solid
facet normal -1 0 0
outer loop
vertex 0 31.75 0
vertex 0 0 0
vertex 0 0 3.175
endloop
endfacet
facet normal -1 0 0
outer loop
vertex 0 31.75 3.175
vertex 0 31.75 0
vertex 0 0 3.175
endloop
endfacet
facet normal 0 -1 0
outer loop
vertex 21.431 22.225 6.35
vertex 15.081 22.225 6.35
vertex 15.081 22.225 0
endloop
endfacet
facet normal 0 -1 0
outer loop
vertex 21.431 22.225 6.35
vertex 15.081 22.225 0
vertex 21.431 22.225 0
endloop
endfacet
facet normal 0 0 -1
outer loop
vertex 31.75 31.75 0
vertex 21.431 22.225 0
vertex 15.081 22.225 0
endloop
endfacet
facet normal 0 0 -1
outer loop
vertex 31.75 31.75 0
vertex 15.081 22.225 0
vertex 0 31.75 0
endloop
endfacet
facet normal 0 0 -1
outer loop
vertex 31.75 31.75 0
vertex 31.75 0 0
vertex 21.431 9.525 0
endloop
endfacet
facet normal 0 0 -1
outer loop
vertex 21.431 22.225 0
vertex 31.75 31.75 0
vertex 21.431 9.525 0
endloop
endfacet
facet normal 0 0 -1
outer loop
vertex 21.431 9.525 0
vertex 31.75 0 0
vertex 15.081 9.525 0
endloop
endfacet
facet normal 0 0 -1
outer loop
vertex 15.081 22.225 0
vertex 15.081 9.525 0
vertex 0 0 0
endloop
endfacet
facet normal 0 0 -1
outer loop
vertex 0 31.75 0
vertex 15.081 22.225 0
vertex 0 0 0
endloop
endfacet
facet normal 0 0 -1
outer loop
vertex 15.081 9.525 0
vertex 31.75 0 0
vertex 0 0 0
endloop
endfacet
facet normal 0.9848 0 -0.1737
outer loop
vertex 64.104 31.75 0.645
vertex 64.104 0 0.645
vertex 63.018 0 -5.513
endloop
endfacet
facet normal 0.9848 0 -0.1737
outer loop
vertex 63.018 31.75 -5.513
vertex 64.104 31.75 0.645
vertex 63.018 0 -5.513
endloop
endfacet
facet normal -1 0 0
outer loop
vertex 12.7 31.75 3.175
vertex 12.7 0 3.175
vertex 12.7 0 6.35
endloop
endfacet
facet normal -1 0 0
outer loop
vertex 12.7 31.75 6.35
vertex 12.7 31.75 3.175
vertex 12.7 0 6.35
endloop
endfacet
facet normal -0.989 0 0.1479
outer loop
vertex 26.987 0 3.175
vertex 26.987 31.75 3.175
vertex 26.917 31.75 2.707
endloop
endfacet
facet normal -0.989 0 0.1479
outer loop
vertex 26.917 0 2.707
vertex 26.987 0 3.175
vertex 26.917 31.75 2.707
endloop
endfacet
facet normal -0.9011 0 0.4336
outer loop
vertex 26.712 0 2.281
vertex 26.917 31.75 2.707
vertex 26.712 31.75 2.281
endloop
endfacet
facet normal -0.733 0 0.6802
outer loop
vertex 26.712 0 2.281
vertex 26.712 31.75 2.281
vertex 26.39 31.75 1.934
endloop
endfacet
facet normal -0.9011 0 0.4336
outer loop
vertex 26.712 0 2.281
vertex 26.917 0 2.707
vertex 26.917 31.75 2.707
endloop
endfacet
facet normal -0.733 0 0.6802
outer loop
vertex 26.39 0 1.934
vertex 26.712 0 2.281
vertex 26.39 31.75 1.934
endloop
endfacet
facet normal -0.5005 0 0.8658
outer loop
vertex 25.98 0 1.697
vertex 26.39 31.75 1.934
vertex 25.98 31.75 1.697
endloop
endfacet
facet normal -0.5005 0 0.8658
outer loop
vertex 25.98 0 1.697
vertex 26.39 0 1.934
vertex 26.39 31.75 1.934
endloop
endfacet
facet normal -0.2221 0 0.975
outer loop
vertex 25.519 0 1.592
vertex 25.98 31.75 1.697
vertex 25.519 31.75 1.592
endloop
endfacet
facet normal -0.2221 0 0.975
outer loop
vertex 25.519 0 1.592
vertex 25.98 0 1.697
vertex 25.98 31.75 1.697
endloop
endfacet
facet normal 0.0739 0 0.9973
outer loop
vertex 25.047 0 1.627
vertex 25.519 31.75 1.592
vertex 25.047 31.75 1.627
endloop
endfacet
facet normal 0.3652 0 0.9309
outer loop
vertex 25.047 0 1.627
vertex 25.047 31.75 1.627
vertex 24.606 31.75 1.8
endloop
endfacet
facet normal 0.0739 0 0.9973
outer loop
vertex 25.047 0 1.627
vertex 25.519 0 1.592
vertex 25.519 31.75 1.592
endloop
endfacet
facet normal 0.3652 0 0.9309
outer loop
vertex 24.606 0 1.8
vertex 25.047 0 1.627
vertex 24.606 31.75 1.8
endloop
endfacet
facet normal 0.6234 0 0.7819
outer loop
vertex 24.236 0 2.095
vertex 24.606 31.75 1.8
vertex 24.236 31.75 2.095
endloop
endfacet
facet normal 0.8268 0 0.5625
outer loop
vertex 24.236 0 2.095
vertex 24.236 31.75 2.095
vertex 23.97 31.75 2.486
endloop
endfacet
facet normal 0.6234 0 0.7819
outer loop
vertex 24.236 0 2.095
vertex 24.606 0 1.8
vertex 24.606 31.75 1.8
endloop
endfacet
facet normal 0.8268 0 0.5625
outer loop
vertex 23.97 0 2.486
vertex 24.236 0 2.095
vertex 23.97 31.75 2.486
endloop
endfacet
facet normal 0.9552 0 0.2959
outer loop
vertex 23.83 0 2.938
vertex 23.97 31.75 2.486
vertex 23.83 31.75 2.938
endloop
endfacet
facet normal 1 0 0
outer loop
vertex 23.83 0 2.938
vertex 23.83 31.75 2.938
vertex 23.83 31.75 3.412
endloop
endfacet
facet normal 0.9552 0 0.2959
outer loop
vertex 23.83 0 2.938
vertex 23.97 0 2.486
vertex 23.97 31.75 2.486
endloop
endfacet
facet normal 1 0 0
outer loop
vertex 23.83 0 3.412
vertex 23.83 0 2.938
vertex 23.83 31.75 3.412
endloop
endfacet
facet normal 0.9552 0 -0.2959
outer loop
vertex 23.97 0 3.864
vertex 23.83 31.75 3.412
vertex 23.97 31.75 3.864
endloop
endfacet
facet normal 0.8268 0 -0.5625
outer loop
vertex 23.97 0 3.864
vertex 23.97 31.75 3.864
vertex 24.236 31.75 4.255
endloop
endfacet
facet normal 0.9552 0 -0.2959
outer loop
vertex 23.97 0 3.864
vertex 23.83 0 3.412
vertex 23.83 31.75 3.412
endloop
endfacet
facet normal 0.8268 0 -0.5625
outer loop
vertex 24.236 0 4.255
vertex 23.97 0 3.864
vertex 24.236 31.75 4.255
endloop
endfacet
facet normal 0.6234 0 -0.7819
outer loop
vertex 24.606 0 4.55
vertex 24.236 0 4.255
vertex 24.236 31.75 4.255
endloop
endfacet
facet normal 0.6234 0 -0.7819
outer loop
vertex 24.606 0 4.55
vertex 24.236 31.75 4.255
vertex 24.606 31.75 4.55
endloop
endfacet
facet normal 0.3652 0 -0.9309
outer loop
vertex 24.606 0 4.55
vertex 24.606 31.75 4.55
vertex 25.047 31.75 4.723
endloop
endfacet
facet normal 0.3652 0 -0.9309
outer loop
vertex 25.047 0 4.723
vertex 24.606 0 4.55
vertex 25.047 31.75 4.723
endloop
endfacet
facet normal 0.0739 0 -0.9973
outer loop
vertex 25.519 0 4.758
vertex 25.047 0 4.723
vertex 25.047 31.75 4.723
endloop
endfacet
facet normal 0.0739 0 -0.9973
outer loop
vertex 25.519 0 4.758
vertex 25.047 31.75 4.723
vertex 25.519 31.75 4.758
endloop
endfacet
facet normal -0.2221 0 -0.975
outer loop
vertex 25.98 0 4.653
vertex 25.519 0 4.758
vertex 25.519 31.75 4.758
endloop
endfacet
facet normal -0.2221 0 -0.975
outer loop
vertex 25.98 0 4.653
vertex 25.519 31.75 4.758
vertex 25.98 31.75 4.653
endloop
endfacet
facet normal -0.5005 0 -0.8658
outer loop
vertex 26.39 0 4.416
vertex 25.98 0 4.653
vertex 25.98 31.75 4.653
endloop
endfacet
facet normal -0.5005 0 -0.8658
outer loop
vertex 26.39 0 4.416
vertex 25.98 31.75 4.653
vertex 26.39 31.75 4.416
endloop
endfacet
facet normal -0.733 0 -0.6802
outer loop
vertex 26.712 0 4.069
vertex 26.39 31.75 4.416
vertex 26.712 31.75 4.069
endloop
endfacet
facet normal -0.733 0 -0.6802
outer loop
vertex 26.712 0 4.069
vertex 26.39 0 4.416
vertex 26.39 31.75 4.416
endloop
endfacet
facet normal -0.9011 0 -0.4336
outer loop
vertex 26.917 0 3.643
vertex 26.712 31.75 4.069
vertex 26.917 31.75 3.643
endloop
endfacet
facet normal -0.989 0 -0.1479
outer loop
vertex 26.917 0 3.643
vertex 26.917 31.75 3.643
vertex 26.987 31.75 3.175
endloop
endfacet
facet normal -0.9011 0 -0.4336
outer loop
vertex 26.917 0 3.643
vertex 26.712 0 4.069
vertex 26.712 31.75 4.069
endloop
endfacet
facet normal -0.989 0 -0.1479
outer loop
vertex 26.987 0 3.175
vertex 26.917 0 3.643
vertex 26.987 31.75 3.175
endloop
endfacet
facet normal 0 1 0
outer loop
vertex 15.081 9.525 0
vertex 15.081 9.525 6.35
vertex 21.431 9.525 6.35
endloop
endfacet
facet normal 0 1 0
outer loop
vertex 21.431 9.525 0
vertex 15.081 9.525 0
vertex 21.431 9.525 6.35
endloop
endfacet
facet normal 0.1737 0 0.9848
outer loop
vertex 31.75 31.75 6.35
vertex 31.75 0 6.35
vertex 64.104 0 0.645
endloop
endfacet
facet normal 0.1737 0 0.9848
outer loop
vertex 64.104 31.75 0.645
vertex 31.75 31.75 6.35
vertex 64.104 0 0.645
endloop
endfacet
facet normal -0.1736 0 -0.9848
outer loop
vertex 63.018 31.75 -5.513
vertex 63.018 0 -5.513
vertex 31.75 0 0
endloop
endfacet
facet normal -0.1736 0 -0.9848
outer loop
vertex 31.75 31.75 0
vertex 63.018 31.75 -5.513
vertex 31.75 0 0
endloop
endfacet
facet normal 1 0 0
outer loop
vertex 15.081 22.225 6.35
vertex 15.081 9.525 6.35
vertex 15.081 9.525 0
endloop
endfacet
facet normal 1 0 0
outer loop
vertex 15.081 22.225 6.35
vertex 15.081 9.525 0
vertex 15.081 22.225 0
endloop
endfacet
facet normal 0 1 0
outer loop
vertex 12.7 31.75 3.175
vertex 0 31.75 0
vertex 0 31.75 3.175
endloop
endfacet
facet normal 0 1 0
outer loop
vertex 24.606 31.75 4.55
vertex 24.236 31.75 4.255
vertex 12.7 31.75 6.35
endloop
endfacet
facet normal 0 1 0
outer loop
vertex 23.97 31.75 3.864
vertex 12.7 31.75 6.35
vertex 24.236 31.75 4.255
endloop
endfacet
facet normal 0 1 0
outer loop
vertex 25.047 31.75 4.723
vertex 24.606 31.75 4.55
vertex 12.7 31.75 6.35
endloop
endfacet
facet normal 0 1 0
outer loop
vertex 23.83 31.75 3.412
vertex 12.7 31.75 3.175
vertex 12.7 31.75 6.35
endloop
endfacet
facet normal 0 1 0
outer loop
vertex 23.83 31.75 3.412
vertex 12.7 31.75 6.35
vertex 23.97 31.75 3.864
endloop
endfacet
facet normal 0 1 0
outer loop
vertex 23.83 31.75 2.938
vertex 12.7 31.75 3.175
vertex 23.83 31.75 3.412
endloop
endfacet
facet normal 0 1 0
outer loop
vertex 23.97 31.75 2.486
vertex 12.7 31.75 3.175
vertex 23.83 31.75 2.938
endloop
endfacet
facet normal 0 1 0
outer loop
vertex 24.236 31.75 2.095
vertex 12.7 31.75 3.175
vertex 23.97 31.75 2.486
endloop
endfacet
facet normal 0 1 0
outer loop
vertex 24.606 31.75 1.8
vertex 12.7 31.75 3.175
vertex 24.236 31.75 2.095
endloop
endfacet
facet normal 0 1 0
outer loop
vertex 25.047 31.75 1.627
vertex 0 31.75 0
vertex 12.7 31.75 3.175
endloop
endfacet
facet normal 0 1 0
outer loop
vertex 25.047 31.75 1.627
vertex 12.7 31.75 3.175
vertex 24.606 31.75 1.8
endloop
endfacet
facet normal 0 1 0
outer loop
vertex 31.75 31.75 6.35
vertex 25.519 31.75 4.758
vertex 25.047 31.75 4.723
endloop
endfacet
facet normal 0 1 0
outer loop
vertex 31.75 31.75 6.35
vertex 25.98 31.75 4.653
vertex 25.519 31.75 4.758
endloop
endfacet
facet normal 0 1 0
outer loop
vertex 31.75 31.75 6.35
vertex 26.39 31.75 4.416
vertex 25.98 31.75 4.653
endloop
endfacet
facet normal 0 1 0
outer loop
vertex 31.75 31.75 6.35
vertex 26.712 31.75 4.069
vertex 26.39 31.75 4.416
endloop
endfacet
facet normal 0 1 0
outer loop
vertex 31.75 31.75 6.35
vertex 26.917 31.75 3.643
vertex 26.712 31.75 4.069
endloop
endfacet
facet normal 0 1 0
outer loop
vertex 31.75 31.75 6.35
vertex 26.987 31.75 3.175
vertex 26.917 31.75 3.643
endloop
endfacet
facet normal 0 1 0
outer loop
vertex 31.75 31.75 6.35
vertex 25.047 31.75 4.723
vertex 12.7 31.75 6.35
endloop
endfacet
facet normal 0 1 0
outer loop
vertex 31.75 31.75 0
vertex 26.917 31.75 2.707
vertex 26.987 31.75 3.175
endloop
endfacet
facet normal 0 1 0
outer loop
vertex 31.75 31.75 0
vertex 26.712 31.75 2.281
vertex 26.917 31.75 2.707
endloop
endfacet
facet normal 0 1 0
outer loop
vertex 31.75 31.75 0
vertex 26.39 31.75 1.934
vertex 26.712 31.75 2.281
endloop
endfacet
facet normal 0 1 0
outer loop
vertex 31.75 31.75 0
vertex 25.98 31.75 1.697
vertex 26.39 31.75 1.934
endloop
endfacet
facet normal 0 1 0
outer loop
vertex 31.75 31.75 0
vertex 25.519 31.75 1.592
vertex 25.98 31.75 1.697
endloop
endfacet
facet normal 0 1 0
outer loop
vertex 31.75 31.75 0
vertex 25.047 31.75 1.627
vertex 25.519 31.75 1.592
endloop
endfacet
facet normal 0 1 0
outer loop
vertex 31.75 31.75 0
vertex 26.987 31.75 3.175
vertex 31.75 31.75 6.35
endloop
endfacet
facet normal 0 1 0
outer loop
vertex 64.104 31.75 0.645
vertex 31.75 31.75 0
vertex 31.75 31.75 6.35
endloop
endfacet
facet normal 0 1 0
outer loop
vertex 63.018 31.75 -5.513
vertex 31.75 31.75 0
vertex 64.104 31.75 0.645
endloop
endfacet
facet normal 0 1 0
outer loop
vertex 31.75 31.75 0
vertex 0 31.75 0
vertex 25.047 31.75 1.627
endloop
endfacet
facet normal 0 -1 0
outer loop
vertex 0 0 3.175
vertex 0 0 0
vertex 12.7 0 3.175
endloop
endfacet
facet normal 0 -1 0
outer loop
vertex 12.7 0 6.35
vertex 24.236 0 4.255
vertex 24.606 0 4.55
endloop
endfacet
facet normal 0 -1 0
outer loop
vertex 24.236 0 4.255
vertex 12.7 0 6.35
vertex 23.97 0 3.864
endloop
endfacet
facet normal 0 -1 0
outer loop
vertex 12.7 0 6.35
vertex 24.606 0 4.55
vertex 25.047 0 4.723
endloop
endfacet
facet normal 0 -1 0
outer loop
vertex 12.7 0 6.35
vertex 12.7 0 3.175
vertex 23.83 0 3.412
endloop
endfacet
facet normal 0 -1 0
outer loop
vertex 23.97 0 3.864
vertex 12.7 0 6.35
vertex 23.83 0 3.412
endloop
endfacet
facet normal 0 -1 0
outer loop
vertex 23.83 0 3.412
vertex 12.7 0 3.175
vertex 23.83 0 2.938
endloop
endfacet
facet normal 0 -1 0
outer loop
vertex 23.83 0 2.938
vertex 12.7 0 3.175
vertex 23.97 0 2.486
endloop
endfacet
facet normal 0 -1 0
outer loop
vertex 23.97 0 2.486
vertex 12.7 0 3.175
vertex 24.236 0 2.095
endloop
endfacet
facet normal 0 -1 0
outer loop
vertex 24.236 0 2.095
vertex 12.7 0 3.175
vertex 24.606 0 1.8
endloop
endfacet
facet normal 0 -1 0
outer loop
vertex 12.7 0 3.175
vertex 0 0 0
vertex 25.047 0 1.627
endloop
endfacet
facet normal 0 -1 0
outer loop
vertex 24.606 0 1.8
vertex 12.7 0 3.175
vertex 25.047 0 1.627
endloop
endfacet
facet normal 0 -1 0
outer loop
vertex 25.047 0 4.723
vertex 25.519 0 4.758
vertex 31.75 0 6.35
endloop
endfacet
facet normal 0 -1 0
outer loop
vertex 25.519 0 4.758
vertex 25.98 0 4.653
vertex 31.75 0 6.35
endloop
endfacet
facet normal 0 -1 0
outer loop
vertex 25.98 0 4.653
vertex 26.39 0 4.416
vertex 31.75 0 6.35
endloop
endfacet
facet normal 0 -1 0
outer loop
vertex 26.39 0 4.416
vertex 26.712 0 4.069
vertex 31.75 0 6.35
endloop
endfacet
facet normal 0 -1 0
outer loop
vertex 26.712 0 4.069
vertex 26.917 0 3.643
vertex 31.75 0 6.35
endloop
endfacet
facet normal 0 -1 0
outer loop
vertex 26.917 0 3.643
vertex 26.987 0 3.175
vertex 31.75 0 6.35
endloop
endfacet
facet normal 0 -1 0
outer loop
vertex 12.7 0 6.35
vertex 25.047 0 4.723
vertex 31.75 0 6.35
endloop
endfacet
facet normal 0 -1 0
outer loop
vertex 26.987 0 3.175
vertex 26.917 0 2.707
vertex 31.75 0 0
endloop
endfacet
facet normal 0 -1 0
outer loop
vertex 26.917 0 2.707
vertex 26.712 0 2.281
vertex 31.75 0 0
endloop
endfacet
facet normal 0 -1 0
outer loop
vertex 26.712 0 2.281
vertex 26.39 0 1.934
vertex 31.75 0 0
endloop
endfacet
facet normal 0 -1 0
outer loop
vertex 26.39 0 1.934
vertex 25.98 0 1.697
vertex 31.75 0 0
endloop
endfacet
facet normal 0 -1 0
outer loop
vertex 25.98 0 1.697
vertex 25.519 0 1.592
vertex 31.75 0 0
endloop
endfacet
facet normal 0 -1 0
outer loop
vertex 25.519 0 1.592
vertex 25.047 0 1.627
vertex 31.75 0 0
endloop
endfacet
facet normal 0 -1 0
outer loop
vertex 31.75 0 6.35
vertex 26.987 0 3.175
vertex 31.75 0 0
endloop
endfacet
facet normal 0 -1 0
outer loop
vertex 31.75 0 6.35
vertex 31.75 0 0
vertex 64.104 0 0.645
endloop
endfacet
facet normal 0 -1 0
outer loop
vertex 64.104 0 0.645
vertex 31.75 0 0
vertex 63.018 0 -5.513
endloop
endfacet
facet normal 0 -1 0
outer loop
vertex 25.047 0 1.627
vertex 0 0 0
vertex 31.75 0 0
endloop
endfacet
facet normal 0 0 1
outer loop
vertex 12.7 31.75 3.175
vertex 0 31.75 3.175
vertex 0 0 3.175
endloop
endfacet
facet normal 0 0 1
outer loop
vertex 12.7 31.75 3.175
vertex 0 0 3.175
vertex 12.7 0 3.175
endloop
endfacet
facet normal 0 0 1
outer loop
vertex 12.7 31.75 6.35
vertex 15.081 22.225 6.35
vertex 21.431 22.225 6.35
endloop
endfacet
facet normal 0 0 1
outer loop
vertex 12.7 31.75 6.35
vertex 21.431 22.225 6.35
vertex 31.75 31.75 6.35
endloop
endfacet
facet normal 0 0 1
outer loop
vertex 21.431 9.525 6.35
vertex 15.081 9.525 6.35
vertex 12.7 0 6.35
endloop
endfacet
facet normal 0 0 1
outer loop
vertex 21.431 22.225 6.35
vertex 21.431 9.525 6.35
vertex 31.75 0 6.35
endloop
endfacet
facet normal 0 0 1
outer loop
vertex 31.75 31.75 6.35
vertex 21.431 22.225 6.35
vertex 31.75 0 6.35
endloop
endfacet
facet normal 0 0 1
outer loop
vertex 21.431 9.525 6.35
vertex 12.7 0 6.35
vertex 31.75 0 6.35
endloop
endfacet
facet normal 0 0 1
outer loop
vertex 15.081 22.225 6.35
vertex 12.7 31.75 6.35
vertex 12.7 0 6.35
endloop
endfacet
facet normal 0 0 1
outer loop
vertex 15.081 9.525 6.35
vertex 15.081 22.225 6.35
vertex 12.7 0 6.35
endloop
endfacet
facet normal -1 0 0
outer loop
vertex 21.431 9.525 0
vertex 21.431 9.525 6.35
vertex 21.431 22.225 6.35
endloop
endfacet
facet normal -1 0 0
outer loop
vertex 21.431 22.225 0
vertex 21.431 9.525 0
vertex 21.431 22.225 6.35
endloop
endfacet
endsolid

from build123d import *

# Parameters (mm, degrees)
SKETCH1_R           = 1.5875
BOSS_EXTRUDE1_DEPTH = 31.75
SKETCH2_W           = 6.35
SKETCH2_H           = 12.7
CUT_EXTRUDE1_DEPTH  = 12.863329641


with BuildPart() as part:
    # Sketch1 → Boss-Extrude1 (new body)
    with BuildSketch(Plane(origin=(0, 0, 0), x_dir=(1, 0, 0), z_dir=(0, 1, 0))):
        Polygon((12.7, -6.35), (31.75, -6.35), (64.103560113, -0.64519443), (63.017646158, 5.513329641), (31.75, 0), (0, 0), (0, -3.175), (12.7, -3.175), align=None)
        with Locations((25.4, -3.175)):
            Circle(SKETCH1_R, mode=Mode.SUBTRACT)
    extrude(amount=BOSS_EXTRUDE1_DEPTH)

    # Sketch2 → Cut-Extrude1 (cut, through all)
    with BuildSketch(Plane.XY.offset(6.35)):
        with Locations((18.25625, 15.875)):
            Rectangle(SKETCH2_W, SKETCH2_H)
    extrude(amount=-CUT_EXTRUDE1_DEPTH, mode=Mode.SUBTRACT)


solid = part.part
